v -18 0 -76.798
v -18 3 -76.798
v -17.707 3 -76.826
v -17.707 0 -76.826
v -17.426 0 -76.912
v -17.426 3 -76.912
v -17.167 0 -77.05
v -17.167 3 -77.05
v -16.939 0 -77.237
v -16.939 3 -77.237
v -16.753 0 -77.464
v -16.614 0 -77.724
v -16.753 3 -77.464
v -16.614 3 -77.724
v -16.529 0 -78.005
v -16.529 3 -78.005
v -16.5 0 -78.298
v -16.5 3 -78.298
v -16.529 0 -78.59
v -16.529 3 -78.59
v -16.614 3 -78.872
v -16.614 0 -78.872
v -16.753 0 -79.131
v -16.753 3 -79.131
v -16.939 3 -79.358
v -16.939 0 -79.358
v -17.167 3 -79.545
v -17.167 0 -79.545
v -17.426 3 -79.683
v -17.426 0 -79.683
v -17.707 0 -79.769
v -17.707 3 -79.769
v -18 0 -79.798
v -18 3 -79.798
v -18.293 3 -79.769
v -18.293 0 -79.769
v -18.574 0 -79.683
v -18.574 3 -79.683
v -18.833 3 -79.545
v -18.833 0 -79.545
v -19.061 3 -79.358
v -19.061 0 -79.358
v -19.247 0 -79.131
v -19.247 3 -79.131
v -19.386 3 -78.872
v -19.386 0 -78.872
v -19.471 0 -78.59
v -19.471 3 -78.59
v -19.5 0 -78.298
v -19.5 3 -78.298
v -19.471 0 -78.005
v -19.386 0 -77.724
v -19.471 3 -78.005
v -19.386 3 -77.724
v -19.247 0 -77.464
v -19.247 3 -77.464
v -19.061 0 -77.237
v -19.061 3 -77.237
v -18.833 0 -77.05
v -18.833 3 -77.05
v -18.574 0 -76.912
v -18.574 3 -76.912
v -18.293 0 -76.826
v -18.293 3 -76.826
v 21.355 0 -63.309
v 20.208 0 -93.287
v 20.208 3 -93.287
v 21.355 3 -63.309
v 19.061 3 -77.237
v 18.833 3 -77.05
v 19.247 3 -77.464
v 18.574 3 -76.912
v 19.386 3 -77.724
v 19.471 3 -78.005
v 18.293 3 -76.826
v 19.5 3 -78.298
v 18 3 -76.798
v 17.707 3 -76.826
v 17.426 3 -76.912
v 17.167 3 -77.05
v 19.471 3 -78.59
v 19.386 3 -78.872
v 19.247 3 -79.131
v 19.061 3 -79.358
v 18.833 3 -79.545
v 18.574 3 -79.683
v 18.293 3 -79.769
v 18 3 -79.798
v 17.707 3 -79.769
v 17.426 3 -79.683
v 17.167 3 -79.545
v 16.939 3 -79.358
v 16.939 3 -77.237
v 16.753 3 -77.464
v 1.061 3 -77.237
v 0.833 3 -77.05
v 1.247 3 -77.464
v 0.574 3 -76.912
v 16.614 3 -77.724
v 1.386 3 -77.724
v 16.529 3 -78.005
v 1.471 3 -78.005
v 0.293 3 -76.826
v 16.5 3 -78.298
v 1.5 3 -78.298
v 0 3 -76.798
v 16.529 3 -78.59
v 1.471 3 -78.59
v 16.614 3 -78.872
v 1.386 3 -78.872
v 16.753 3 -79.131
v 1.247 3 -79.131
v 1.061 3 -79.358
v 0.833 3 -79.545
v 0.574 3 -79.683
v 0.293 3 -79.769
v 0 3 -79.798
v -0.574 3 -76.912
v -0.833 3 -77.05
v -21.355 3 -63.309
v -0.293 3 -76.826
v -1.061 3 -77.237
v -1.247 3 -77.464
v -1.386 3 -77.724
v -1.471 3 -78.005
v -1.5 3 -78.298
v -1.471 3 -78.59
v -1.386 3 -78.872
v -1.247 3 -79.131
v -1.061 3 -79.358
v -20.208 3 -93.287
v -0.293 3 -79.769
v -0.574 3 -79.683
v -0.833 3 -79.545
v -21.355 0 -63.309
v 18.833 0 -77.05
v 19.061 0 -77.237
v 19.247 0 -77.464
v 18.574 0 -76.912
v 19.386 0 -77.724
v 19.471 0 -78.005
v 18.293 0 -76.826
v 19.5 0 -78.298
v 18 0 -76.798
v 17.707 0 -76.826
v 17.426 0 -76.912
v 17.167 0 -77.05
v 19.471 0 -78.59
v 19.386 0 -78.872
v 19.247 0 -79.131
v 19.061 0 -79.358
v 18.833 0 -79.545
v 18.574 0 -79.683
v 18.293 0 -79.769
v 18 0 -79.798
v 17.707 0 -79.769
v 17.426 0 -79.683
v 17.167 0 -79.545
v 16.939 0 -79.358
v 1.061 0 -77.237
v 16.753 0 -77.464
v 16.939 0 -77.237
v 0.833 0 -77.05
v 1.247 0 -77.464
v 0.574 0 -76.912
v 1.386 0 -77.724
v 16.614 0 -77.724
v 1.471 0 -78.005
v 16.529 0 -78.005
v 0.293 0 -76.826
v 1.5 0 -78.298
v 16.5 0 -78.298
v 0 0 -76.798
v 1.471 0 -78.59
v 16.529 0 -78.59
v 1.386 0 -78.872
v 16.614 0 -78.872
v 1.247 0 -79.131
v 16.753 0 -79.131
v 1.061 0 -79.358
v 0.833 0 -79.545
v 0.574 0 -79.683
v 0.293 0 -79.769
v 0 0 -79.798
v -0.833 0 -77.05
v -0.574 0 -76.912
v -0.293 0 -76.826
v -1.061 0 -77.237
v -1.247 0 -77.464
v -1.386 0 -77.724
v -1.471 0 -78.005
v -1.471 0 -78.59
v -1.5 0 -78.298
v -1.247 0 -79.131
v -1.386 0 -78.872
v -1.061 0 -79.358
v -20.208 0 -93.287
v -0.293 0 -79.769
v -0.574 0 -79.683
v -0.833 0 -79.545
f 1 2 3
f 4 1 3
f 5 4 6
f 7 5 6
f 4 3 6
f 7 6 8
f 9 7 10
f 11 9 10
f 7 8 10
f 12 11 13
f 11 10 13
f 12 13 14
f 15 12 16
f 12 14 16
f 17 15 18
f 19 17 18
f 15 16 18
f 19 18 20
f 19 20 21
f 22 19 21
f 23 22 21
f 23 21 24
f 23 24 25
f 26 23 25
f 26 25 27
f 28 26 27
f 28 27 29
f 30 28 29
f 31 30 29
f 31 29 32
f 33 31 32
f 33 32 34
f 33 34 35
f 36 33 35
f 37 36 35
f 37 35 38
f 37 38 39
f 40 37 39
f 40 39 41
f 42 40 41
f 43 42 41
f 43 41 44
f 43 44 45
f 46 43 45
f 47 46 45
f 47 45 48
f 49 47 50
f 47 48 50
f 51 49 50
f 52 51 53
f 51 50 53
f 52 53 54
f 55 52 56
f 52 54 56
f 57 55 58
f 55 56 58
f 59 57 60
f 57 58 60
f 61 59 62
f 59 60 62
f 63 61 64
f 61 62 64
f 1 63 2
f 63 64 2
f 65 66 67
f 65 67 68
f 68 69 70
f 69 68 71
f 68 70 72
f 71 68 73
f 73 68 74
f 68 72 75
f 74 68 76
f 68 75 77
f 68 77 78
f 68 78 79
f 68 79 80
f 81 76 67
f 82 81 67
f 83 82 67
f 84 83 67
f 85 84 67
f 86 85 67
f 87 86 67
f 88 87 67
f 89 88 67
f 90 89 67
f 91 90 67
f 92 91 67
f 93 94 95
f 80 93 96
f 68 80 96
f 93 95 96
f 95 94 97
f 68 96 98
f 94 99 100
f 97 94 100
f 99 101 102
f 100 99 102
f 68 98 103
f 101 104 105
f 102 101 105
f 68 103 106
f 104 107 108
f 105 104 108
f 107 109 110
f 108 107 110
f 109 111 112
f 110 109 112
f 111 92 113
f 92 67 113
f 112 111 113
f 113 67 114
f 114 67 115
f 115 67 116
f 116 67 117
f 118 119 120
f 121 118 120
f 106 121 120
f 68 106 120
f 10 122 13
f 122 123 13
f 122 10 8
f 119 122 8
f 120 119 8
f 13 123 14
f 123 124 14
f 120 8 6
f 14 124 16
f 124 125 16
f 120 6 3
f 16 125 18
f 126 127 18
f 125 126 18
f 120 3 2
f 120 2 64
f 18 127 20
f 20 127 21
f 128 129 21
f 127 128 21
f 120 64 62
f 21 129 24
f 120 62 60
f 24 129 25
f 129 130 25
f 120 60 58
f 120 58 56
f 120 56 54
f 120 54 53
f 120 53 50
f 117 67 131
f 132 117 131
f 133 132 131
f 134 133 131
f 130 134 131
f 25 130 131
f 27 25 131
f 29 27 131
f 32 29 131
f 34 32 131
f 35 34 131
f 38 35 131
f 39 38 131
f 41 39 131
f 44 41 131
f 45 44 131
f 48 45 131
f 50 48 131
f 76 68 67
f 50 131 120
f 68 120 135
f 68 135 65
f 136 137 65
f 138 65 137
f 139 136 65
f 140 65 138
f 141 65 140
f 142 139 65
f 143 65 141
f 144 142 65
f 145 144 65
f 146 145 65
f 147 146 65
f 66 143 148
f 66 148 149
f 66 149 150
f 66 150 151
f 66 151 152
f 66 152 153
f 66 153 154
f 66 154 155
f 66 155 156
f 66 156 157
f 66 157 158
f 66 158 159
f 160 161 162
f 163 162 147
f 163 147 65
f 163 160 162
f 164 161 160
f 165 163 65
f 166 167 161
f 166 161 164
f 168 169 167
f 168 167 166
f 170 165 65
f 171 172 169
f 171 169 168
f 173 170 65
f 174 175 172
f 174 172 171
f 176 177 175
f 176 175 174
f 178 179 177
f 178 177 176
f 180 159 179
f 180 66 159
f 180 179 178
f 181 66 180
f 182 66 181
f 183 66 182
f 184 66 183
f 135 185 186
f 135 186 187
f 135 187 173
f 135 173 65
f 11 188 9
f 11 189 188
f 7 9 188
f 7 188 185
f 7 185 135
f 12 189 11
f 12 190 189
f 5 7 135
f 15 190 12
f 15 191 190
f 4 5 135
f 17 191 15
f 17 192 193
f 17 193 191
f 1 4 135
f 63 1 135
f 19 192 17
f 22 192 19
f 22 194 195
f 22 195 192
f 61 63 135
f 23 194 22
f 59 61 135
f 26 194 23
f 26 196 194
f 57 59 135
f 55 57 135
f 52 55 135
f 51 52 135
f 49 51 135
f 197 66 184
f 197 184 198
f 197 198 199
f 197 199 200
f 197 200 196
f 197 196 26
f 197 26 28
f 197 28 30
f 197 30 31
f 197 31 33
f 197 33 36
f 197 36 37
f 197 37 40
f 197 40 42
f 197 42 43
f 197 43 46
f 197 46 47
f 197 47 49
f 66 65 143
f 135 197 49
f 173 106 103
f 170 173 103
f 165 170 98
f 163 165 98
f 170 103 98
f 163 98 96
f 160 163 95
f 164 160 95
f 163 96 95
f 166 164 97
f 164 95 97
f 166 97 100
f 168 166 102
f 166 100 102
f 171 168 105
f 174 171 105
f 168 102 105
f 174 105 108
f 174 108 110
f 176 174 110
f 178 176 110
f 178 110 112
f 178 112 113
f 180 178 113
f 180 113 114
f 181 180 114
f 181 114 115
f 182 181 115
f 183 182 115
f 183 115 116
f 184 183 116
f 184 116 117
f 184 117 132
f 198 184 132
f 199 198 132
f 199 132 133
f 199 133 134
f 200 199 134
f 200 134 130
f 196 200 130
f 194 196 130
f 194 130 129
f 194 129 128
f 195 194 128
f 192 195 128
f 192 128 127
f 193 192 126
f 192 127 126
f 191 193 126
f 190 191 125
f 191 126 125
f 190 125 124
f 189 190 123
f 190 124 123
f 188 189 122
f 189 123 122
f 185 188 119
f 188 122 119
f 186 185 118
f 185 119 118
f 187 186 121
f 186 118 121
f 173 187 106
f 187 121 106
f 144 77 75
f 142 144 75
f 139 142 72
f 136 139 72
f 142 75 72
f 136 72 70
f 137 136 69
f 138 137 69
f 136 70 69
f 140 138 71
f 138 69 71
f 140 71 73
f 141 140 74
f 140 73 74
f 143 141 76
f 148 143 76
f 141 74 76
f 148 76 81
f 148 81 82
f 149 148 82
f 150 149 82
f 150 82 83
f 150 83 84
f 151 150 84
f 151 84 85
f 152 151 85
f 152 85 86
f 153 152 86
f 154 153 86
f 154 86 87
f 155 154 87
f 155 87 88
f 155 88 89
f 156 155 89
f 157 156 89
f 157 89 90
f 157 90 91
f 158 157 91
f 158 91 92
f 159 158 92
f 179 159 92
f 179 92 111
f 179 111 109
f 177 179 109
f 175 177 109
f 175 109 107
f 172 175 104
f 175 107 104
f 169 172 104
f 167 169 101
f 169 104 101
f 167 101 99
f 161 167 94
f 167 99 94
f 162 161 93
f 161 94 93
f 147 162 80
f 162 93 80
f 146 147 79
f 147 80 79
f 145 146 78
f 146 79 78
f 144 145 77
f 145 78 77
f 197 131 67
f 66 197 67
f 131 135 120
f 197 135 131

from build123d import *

# Parameters (mm, degrees)
SALIENTE_EXTRUIR1_DEPTH = 3
CROQUIS2_R              = 1.5
CORTAR_EXTRUIR1_DEPTH   = 4
CROQUIS3_W              = 40.415918572
CROQUIS3_H              = 97.617868818
CROQUIS3_W_2            = 62.592919448
CROQUIS3_H_2            = 252.082446821
CORTAR_EXTRUIR2_DEPTH   = 18


with BuildPart() as part:
    # Croquis1 → Saliente-Extruir1 (new body)
    with BuildSketch(Plane(origin=(0, 0, 0), x_dir=(1, 0, 0), z_dir=(0, 1, 0))):
        Polygon((31, -188.773821898), (-31, -188.773821898), (-16.554484331, 188.773821898), (16.554484331, 188.773821898), align=None)
    extrude(amount=SALIENTE_EXTRUIR1_DEPTH)

    # Croquis2 → Cortar-Extruir1 (cut)
    with BuildSketch(Plane(origin=(0, 3, 0), x_dir=(1, 0, 0), z_dir=(0, 1, 0))):
        with Locations(Location((0, 78.297657431, 0), (0, 0, 270))):
            Circle(CROQUIS2_R)
        with Locations(Location((-18, 78.297657431, 0), (0, 0, 270))):
            Circle(CROQUIS2_R)
        with Locations(Location((18, 78.297657431, 0), (0, 0, 270))):
            Circle(CROQUIS2_R)
    extrude(amount=-CORTAR_EXTRUIR1_DEPTH, mode=Mode.SUBTRACT)

    # Croquis3 → Cortar-Extruir2 (cut)
    with BuildSketch(Plane(origin=(0, 3, 0), x_dir=(1, 0, 0), z_dir=(0, 1, 0))):
        with Locations((0, 142.095624348)):
            Rectangle(CROQUIS3_W, CROQUIS3_H)
        with Locations((0.296459724, -62.732598488)):
            Rectangle(CROQUIS3_W_2, CROQUIS3_H_2)
    extrude(amount=-CORTAR_EXTRUIR2_DEPTH, mode=Mode.SUBTRACT)


solid = part.part
